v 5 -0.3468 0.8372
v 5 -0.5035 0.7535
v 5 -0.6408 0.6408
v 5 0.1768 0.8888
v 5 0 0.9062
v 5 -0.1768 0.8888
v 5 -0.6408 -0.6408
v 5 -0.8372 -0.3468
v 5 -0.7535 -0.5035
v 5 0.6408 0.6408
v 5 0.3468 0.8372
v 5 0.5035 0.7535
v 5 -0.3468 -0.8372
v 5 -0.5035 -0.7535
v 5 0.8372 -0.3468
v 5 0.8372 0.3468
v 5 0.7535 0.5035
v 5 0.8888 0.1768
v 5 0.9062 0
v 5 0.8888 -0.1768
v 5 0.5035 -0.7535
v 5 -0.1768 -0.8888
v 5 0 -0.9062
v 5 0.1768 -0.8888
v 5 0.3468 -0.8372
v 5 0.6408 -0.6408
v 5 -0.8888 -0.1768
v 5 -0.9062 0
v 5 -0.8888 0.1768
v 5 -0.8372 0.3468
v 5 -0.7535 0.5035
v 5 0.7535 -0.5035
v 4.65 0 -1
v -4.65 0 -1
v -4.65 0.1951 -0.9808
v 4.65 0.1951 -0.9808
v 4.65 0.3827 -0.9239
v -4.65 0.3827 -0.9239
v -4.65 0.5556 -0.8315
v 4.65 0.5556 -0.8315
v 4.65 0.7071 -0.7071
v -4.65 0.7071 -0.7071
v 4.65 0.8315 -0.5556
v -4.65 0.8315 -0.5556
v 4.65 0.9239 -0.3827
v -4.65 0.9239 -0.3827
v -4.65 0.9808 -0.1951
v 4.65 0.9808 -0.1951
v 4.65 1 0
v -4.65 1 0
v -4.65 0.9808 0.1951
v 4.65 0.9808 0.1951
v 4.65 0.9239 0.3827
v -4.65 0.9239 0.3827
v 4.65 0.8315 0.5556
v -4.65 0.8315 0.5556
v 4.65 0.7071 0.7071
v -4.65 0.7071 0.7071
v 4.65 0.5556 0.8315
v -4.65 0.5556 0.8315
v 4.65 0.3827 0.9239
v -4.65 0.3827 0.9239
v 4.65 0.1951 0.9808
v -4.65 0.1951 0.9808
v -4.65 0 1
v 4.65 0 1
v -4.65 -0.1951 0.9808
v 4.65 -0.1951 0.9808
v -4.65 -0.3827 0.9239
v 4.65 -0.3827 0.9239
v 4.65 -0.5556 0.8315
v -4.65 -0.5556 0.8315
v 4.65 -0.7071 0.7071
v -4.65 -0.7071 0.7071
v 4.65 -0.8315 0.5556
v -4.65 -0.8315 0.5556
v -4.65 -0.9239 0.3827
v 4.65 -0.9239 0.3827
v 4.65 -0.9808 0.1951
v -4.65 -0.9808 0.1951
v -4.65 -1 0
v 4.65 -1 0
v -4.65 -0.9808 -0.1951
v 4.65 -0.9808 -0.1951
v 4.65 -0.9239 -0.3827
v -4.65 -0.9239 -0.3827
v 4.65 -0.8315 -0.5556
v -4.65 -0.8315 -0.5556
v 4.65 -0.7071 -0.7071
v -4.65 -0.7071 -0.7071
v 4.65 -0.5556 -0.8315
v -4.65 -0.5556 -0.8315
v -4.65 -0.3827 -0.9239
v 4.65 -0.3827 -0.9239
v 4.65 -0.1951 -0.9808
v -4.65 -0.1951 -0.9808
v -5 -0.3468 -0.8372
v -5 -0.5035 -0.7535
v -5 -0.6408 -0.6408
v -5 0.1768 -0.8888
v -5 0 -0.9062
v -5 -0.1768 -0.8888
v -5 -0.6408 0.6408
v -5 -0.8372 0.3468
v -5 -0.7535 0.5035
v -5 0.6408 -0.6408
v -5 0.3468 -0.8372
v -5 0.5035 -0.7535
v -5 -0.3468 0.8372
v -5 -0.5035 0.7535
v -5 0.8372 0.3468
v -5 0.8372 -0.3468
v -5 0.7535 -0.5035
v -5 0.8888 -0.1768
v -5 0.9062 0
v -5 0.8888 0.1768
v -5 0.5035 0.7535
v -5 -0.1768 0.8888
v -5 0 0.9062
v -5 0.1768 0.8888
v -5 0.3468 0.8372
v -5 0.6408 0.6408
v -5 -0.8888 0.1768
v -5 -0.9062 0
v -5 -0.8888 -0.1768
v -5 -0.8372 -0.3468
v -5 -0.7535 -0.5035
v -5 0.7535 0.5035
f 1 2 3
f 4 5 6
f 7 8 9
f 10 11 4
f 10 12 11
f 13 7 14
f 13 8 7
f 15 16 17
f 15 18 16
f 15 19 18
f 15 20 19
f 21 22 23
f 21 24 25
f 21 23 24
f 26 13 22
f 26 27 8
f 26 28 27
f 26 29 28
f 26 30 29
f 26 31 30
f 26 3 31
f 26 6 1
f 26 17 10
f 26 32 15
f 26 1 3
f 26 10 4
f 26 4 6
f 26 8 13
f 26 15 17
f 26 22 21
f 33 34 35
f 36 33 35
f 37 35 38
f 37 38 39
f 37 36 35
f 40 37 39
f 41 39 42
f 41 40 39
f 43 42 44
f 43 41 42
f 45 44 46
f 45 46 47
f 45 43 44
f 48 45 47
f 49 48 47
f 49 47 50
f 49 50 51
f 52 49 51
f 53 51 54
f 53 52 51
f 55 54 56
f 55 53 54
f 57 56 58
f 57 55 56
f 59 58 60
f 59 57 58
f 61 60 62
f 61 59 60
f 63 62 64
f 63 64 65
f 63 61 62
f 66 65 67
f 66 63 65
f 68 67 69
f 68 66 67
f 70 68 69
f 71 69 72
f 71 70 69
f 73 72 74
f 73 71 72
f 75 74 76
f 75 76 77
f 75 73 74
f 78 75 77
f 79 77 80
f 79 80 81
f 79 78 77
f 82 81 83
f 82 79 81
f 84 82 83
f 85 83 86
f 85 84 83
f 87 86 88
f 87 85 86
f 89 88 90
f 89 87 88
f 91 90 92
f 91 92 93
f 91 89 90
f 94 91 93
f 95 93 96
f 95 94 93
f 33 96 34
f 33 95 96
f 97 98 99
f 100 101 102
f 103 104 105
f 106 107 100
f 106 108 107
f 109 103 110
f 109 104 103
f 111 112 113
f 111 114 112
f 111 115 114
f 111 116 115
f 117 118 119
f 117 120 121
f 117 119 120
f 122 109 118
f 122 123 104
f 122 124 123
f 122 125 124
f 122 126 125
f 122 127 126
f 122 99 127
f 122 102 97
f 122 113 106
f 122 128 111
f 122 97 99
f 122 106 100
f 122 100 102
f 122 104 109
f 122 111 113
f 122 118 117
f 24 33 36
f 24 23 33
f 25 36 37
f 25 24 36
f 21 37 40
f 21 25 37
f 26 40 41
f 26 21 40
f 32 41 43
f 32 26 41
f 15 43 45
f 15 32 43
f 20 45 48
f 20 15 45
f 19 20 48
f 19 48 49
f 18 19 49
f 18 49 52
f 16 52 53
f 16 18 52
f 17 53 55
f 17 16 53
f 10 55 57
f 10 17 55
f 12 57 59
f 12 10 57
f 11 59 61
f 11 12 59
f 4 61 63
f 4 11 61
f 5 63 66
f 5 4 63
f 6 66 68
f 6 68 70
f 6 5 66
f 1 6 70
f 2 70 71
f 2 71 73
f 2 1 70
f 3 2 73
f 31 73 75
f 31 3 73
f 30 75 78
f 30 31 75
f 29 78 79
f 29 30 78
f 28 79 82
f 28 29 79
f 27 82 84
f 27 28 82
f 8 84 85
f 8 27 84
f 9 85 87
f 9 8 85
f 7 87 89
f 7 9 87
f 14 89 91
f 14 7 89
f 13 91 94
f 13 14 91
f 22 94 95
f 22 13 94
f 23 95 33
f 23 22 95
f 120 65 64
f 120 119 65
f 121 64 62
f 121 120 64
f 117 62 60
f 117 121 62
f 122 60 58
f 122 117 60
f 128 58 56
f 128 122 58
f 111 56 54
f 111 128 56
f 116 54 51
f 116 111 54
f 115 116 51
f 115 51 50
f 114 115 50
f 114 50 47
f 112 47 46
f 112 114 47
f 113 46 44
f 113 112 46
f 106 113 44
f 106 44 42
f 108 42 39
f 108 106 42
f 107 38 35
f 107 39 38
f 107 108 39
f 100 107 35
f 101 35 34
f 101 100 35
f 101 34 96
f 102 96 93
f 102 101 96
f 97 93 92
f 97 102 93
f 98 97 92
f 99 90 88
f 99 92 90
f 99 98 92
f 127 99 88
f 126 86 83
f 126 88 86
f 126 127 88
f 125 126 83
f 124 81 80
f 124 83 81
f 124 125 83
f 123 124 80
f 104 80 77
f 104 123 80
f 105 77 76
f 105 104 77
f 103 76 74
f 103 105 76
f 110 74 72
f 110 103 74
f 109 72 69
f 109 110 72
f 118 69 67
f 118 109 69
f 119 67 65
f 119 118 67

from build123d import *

# Parameters (mm, degrees)
SKETCH2_R           = 1
EXTRUDE1_DEPTH      = 4.65
EXTRUDE1_DEPTH_BACK = 4.65
SKETCH3_R           = 1
EXTRUDE2_DEPTH      = 0.35
EXTRUDE2_TAPER      = 15
SKETCH4_R           = 1
EXTRUDE3_DEPTH      = 0.35
EXTRUDE3_TAPER      = 15


with BuildPart() as part:
    # Sketch2 → Extrude1 (new body, two sides)
    with BuildSketch(Plane(origin=(0, 0, 0), x_dir=(0, 0, -1), z_dir=(1, 0, 0))) as extrude1_sk:
        Circle(SKETCH2_R)
    extrude(amount=EXTRUDE1_DEPTH)
    extrude(extrude1_sk.sketch, amount=-EXTRUDE1_DEPTH_BACK)

    # Sketch3 → Extrude2 (add)
    with BuildSketch(Plane(origin=(4.65, 0, 0), x_dir=(0, 0, -1), z_dir=(1, 0, 0))):
        Circle(SKETCH3_R)
    extrude(amount=EXTRUDE2_DEPTH, taper=EXTRUDE2_TAPER)

    # Sketch4 → Extrude3 (add)
    with BuildSketch(Plane.ZY.offset(4.65)):
        Circle(SKETCH4_R)
    extrude(amount=EXTRUDE3_DEPTH, taper=EXTRUDE3_TAPER)


solid = part.part
